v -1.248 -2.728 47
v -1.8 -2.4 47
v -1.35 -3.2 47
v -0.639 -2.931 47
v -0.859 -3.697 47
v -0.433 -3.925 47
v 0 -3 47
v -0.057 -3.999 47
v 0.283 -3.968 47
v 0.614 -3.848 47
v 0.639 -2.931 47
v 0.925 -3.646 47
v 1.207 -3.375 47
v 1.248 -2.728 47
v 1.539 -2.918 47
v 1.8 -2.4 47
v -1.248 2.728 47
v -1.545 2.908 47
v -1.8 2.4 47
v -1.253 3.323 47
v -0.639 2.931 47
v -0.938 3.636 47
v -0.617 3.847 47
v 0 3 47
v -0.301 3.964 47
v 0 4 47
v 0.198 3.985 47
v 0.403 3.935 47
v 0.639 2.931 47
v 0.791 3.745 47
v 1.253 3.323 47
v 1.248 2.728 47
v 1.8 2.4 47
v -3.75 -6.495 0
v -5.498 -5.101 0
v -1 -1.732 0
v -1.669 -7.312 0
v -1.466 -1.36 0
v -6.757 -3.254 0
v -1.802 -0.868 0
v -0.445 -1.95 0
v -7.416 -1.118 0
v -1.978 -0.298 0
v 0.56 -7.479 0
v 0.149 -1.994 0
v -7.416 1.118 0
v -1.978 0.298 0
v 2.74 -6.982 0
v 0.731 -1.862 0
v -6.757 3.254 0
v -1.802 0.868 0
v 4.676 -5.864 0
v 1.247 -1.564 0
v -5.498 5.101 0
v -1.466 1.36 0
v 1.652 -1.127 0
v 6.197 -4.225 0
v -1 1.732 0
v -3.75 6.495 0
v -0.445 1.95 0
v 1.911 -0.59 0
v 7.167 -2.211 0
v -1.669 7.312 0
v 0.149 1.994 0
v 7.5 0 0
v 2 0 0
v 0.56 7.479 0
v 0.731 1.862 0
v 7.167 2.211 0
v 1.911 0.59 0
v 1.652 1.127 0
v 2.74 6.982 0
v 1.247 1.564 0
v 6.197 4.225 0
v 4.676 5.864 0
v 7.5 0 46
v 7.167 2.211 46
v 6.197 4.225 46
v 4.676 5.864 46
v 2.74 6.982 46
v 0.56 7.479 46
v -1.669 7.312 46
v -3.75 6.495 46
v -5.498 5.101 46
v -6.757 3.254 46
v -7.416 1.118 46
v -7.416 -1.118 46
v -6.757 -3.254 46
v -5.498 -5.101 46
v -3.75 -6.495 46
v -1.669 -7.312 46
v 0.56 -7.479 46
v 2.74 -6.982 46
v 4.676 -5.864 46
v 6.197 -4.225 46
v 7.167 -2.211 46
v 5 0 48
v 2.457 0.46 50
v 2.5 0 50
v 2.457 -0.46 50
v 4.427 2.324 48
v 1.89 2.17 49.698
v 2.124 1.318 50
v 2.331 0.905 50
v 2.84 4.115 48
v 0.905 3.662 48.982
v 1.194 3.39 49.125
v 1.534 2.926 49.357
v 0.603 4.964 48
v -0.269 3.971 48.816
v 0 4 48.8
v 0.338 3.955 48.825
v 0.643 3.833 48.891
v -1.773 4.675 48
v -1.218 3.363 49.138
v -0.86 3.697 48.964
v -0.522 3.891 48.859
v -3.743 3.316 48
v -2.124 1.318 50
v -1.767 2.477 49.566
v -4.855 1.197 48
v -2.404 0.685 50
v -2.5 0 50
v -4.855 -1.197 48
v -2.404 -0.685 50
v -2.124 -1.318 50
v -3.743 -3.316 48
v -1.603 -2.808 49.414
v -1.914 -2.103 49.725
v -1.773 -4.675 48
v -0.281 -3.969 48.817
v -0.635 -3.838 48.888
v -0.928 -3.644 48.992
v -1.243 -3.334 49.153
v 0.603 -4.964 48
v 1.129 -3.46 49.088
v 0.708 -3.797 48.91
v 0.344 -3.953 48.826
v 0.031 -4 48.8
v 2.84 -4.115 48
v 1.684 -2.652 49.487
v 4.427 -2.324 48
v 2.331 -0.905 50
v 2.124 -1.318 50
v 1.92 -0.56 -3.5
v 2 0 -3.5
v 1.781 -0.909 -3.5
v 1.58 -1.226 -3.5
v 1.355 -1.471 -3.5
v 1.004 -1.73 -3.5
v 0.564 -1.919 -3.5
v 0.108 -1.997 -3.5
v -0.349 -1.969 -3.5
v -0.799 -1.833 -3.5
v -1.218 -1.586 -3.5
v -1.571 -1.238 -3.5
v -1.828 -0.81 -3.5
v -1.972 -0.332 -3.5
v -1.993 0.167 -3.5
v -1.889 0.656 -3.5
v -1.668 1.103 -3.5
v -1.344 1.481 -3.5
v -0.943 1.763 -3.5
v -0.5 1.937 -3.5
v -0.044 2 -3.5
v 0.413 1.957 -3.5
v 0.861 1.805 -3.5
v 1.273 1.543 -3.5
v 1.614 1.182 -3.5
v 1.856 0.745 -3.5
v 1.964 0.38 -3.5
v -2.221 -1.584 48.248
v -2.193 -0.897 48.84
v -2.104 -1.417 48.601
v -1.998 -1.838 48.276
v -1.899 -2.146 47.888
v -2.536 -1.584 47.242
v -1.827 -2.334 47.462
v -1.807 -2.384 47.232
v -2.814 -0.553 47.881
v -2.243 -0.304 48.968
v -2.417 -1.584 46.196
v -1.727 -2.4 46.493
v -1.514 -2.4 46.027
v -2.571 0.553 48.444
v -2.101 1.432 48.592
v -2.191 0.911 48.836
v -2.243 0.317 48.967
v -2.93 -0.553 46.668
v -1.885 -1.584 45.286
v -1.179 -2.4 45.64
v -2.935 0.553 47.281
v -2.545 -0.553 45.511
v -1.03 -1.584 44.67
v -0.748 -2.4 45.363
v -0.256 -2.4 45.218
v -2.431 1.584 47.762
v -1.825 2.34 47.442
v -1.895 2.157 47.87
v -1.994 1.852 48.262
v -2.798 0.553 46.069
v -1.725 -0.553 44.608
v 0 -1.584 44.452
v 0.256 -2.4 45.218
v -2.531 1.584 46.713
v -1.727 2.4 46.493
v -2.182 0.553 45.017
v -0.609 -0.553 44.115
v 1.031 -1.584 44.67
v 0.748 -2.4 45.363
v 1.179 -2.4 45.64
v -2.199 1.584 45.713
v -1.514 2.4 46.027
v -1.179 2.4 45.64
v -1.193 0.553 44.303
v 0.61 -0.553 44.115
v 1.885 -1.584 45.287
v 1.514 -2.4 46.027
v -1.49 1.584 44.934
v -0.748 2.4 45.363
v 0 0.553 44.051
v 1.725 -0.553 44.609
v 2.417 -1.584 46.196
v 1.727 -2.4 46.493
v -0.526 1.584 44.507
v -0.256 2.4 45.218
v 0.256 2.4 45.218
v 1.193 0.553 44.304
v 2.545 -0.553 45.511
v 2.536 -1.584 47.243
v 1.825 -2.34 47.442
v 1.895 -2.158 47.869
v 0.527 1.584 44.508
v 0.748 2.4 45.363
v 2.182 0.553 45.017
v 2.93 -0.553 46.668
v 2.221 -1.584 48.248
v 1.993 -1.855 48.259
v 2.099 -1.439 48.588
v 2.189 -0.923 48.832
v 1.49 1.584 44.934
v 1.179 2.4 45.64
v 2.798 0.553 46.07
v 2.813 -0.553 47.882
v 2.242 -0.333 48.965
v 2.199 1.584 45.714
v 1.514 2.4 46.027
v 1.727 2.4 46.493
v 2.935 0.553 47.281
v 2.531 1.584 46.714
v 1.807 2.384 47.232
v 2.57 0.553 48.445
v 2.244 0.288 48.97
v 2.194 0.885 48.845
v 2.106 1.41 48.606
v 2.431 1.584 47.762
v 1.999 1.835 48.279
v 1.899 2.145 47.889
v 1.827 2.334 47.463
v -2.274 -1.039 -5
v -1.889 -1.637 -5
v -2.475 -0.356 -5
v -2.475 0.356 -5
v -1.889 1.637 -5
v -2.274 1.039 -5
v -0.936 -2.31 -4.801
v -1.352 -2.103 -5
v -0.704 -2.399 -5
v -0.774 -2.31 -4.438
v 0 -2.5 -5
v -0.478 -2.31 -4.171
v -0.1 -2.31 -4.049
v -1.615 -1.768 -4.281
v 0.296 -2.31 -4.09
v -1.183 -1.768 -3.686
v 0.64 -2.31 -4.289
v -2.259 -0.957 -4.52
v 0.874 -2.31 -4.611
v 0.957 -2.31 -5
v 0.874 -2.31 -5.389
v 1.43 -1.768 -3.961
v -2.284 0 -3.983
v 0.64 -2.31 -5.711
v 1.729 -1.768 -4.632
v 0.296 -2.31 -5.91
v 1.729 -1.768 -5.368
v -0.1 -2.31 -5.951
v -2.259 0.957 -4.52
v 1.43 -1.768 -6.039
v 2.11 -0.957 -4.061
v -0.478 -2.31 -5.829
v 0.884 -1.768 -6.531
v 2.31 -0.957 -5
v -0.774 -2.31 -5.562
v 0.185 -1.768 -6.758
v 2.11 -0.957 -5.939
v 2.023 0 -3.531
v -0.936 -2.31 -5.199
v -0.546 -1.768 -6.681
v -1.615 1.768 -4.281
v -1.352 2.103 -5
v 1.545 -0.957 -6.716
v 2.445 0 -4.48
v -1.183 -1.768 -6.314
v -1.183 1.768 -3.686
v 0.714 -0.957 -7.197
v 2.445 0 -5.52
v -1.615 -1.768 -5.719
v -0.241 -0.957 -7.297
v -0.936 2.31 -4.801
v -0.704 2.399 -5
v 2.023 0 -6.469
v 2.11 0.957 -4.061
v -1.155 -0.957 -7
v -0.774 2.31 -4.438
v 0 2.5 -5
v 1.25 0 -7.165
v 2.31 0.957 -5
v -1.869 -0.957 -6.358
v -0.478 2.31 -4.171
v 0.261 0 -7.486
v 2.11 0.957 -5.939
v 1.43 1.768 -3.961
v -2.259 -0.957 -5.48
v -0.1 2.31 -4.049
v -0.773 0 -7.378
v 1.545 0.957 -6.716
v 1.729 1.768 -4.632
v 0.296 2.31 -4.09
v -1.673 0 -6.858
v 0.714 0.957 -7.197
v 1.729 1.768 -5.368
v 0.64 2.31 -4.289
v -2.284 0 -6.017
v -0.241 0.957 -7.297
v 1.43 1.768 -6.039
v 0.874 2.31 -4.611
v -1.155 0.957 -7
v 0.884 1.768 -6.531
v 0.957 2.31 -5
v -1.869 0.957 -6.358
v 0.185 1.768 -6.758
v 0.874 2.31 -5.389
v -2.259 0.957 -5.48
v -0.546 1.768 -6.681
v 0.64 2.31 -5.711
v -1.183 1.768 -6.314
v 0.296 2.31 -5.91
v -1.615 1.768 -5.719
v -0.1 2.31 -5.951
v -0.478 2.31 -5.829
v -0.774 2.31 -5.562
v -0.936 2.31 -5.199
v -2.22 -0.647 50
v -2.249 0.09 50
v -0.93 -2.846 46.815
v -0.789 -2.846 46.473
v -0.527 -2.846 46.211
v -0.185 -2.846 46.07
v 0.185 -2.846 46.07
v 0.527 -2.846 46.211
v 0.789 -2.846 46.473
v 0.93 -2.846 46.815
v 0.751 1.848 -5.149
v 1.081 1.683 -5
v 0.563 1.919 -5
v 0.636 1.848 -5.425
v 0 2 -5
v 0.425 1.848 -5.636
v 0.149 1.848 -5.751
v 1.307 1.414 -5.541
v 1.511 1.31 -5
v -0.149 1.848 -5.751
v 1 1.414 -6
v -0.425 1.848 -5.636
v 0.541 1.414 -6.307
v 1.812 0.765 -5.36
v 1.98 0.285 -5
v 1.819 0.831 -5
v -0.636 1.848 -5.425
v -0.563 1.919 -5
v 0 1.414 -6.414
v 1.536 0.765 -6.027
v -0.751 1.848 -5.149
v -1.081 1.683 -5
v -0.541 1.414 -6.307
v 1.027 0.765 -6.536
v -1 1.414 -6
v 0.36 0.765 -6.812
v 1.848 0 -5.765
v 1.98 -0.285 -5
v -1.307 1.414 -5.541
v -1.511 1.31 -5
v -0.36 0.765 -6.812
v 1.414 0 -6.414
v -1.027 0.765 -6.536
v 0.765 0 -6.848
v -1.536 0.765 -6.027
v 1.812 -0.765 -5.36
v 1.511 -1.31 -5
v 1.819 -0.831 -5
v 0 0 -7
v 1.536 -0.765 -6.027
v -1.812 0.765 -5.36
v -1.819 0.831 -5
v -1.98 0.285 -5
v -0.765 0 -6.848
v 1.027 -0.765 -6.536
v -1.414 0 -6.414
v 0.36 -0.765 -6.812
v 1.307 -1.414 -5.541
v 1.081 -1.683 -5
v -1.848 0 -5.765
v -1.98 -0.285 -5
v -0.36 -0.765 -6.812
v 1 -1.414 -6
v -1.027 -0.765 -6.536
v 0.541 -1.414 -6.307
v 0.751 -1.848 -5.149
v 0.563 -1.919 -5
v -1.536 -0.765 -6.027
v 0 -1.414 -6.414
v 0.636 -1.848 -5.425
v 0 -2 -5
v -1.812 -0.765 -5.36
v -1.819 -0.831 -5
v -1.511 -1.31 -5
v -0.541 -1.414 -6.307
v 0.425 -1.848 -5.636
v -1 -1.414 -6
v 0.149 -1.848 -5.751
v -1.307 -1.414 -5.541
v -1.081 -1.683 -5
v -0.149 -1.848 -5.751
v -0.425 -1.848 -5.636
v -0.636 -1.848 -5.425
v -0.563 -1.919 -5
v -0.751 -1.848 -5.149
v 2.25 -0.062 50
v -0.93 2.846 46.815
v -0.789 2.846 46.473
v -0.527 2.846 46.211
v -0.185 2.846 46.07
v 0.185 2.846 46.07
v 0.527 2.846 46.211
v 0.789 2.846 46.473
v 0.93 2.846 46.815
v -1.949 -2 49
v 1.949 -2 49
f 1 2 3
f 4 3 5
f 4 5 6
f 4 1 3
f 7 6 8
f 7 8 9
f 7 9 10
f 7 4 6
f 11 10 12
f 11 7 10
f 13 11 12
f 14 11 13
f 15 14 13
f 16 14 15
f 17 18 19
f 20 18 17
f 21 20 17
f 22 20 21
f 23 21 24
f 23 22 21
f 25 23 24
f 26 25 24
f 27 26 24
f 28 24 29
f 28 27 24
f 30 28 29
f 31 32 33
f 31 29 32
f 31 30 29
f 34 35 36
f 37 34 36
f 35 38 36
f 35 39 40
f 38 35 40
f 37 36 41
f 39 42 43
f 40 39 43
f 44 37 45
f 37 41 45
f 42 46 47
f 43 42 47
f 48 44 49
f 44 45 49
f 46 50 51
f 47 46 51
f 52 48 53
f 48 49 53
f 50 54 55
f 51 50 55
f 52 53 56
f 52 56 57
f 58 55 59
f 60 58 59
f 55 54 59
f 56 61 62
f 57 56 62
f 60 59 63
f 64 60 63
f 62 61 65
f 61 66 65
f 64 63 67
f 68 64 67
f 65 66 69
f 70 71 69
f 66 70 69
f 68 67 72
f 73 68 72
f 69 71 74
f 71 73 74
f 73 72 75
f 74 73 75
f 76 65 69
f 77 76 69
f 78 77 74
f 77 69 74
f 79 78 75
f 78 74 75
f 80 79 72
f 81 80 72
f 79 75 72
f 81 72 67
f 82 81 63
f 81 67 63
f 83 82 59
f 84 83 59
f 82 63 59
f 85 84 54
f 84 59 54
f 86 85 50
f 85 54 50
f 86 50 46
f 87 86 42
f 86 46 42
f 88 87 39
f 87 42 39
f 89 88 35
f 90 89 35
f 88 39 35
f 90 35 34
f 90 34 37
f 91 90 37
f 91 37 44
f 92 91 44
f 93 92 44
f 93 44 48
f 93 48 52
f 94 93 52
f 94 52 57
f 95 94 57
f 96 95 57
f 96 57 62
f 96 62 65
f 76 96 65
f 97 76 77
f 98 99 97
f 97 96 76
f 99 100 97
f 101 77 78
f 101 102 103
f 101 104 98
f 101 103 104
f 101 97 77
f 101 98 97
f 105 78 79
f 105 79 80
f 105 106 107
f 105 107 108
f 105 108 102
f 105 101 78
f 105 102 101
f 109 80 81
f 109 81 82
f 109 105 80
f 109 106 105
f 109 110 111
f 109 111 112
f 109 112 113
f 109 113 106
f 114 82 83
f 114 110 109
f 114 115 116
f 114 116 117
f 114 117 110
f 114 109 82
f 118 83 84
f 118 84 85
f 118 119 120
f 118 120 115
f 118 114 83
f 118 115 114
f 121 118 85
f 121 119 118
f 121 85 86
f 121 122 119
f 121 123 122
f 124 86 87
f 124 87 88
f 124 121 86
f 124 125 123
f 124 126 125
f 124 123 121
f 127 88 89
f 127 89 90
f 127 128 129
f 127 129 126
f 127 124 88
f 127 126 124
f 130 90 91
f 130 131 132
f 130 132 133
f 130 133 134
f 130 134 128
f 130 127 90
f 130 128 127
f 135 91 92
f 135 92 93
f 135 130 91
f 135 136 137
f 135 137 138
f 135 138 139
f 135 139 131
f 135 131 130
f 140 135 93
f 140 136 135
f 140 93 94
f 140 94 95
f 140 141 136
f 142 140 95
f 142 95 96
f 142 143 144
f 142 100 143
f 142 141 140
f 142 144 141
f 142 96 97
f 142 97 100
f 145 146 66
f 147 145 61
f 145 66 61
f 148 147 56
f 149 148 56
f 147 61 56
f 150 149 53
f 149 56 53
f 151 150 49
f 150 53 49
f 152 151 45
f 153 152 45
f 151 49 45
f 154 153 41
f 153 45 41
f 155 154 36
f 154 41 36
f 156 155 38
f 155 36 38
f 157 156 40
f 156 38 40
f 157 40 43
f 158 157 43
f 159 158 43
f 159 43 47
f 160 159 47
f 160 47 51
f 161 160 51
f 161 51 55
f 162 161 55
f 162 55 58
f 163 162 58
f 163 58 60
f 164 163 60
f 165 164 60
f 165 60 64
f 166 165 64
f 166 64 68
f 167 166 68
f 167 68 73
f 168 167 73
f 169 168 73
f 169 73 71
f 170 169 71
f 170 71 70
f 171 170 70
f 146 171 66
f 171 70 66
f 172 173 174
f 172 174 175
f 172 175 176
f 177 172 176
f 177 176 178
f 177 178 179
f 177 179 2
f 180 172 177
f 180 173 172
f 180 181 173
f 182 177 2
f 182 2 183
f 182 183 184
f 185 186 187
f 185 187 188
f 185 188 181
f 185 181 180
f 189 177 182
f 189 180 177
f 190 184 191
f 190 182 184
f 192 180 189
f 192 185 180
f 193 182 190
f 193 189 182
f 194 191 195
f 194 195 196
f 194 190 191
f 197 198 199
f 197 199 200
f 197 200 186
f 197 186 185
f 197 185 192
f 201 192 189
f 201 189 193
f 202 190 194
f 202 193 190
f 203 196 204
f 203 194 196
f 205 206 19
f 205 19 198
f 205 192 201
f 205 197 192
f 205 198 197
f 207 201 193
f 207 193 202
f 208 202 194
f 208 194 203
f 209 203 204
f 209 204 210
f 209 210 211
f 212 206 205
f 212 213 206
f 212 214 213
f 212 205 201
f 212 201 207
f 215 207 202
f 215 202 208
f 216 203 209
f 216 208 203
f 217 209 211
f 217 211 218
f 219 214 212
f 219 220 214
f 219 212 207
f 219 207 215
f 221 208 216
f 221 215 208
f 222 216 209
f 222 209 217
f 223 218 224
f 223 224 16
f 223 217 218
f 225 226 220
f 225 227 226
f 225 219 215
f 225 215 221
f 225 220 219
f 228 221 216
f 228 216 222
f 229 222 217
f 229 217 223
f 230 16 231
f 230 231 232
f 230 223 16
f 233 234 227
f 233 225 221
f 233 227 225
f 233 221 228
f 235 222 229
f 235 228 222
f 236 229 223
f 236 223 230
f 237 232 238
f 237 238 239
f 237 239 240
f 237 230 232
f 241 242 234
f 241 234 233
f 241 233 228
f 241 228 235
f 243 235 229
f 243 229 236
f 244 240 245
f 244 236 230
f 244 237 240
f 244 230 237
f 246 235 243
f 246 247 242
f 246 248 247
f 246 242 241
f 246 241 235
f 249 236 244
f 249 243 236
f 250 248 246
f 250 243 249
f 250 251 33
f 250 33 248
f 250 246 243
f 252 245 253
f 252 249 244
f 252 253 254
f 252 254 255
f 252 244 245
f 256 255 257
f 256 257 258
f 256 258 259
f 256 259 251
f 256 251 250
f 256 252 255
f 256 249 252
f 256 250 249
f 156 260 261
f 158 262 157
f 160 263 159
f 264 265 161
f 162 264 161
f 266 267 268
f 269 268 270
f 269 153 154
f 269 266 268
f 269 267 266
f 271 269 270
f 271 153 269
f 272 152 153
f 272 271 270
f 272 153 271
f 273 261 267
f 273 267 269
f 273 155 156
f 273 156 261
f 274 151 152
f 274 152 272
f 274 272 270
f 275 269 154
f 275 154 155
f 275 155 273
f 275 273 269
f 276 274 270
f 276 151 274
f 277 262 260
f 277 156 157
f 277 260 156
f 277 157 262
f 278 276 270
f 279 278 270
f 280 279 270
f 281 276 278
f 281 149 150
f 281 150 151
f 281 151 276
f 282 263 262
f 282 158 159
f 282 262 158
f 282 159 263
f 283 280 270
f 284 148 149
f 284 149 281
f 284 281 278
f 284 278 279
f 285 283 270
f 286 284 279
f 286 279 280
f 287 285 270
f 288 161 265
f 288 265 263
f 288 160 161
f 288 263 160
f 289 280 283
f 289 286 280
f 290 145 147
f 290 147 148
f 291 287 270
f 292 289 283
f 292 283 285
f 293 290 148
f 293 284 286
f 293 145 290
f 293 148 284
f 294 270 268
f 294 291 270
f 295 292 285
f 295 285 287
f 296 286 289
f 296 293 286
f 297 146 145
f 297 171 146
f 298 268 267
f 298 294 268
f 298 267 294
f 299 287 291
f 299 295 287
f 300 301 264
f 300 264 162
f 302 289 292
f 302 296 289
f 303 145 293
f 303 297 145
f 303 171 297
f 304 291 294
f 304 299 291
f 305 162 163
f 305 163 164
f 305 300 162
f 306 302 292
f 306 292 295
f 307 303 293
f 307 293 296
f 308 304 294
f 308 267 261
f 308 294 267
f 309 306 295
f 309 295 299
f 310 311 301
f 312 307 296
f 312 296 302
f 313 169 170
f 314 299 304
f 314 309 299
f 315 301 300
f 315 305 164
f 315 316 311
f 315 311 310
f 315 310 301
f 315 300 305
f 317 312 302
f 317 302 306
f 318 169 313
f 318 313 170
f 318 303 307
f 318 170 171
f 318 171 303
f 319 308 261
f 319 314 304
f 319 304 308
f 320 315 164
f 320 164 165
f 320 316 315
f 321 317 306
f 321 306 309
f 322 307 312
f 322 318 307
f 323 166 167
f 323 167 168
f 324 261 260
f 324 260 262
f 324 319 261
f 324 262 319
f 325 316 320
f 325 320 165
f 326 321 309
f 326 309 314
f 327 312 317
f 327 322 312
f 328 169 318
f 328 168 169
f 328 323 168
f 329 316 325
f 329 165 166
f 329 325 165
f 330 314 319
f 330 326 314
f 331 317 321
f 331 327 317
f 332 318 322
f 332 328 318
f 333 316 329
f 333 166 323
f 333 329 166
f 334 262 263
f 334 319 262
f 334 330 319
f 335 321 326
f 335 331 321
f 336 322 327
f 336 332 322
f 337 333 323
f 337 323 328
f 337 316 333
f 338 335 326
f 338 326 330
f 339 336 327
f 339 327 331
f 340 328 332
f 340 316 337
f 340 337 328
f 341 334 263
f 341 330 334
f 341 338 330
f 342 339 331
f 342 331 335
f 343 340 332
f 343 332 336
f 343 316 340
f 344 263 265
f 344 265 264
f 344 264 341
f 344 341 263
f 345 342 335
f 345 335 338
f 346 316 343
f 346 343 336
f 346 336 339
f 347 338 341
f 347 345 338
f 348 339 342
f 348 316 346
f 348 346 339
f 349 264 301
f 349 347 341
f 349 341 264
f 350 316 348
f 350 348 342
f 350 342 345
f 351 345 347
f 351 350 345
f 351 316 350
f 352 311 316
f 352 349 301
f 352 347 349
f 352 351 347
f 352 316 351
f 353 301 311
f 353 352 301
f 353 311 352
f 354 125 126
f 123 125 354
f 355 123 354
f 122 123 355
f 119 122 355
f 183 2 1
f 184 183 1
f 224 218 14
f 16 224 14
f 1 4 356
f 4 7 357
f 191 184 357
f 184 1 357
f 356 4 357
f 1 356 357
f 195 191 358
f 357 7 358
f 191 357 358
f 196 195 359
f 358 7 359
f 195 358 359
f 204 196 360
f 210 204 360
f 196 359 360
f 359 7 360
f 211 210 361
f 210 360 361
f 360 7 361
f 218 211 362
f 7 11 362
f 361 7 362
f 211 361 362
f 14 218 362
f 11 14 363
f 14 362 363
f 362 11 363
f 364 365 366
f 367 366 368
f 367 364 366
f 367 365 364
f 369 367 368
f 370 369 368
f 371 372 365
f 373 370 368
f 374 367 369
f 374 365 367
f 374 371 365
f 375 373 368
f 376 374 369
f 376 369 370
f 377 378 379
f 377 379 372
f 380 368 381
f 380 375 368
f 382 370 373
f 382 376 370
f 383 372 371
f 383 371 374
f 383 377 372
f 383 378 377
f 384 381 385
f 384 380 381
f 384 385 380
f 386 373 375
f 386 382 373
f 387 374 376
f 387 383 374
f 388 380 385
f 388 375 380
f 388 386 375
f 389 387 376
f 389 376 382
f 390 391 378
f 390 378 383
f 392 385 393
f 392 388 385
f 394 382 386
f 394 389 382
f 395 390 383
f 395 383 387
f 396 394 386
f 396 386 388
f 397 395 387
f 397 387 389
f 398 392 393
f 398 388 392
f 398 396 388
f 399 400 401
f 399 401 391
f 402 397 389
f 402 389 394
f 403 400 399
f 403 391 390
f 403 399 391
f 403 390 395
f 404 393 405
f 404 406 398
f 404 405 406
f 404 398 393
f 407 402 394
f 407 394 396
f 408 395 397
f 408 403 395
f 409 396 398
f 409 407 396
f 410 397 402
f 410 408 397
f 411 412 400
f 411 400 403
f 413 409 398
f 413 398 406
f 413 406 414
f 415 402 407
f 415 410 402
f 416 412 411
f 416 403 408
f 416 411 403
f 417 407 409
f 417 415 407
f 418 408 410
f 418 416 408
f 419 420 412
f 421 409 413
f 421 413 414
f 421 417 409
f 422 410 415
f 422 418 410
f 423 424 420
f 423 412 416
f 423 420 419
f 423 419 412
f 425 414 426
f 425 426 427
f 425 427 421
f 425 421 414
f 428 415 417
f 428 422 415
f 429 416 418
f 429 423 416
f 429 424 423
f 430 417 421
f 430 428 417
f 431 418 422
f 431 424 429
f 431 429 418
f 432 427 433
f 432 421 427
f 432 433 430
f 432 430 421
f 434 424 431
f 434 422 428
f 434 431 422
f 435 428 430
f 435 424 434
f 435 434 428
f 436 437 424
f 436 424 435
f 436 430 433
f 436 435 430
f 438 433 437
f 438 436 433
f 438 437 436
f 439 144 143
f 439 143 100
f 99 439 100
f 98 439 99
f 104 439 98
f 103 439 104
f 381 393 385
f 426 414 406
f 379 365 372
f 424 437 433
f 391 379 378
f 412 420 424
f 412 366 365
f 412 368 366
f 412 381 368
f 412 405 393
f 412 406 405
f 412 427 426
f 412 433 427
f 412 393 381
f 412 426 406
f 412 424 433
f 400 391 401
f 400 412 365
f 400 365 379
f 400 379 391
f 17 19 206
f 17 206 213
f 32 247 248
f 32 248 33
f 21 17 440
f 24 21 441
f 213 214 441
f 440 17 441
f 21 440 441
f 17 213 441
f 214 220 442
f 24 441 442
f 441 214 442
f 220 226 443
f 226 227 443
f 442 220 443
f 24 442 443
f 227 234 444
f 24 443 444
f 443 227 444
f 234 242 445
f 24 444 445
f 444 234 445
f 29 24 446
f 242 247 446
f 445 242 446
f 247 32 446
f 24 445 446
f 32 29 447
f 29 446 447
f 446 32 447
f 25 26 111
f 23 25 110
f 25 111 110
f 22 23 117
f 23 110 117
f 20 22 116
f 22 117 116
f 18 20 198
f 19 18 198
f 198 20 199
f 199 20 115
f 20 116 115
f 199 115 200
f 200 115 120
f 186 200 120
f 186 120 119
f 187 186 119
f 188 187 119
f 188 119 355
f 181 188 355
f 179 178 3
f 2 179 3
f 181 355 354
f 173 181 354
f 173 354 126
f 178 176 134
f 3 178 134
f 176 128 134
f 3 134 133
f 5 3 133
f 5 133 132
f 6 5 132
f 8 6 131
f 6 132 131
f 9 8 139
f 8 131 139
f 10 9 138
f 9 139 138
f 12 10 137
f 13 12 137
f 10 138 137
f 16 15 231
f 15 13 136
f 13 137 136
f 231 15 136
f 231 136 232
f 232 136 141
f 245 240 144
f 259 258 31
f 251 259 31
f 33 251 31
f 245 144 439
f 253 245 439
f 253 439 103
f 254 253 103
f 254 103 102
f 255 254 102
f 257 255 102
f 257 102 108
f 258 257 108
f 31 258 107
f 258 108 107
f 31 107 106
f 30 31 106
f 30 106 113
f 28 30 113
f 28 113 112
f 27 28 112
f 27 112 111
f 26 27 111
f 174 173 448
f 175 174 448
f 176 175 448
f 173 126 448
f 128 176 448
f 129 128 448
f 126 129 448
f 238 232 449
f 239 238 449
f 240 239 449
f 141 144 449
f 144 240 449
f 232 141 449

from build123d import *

# Parameters (mm, degrees)
F0_R     = 7.5
F1_DEPTH = 50
F2_R     = 2
F3_DEPTH = 5
F7_DEPTH = 3


# Not quite as in the source:
# - a fillet or chamfer that OpenCascade refuses, or shapes differently, is made with other operations: its cross-section is extruded or revolved along the edge and cut away or added


with BuildPart() as f1:
    # F0 (on Top) → F1 (new body)
    with BuildSketch(Plane.XY):
        Circle(F0_R)
    extrude(amount=F1_DEPTH)

    # F2 (on face) → F3 (join)
    with BuildSketch(Plane(origin=(0, 0, 0), x_dir=(1, 0, 0), z_dir=(0, 0, -1))):
        Circle(F2_R)
    extrude(amount=F3_DEPTH)

    # F4 (on face) → F5 (revolve)
    with BuildSketch(Plane(origin=(0, 0, -5), x_dir=(1, 0, 0), z_dir=(0, 0, -1))):
        with BuildLine():
            Line((0, 2), (0, 2.5))
            ThreePointArc((0, 2.5), (-2.5, 0), (0, -2.5))
            Line((0, -2.5), (0, -2))
            ThreePointArc((0, -2), (-2, 0), (0, 2))
        make_face()
    revolve(axis=Axis((0, 0, -5), (0, 1, 0)))

    # F6 (on face) → F7 (cut)
    with BuildSketch(Plane.XY.offset(50)):
        with BuildLine():
            add(Edge.make_bspline(
                [(0, 4), (-3.897114317, 4), (-1.9485571585, -2), (0, -8), (1.9485571585, -2), (3.897114317, 4), (0, 4)],
                knots=[0, 0, 0, 2.0943951024, 2.0943951024, 4.1887902048, 4.1887902048, 6.2831853072, 6.2831853072, 6.2831853072], degree=2, weights=[1, 0.5, 1, 0.5, 1, 0.5, 1]))
        make_face()
    extrude(amount=-F7_DEPTH, mode=Mode.SUBTRACT)

    # F8 (on face) → F9 (revolve, cut)
    with BuildSketch(Plane.XY.offset(47)):
        with BuildLine():
            ThreePointArc((1.8, -2.4), (2.683281573, -1.3416407865), (3, 0))
            ThreePointArc((3, 0), (2.683281573, 1.3416407865), (1.8, 2.4))
            add(Edge.make_bspline(
                [(1.8, -2.4), (1.8810311774, -2.2079260981), (1.9485571585, -2), (2.6913429511, 0.2871870789), (1.8, 2.4)],
                knots=[4.0484923357, 4.0484923357, 4.0484923357, 4.1887902048, 4.1887902048, 5.3448576064, 5.3448576064, 5.3448576064], degree=2, weights=[0.9375, 0.9665063509, 1, 0.7240092377, 0.7527020789]))
        make_face()
        with BuildLine():
            Line((0, -3), (0, 3))
            ThreePointArc((0, 3), (-0.9486832981, 2.8460498942), (-1.8, 2.4))
            add(Edge.make_bspline(
                [(-1.8, 2.4), (-2.6913429511, 0.2871870789), (-1.9485571585, -2), (-1.8810311774, -2.2079260981), (-1.8, -2.4)],
                knots=[0.9383277008, 0.9383277008, 0.9383277008, 2.0943951024, 2.0943951024, 2.2346929715, 2.2346929715, 2.2346929715], degree=2, weights=[0.7527020789, 0.7240092377, 1, 0.9665063509, 0.9375]))
            ThreePointArc((-1.8, -2.4), (-0.9486832981, -2.8460498942), (0, -3))
        make_face()
    revolve(axis=Axis((0, 0, 47), (0, -1, 0)), mode=Mode.SUBTRACT)

    # F10: chamfer of 5 x 4 on 1 edges, made by hand

    # F10_s1 → F10_t2 (revolve, cut)
    with BuildSketch(Plane.XZ):
        Polygon((7.5, 46), (2.5, 50), (7.5, 50), align=None)
    revolve(axis=Axis((0, 0, 50), (0, 0, 1)), mode=Mode.SUBTRACT)


solid = f1.part
